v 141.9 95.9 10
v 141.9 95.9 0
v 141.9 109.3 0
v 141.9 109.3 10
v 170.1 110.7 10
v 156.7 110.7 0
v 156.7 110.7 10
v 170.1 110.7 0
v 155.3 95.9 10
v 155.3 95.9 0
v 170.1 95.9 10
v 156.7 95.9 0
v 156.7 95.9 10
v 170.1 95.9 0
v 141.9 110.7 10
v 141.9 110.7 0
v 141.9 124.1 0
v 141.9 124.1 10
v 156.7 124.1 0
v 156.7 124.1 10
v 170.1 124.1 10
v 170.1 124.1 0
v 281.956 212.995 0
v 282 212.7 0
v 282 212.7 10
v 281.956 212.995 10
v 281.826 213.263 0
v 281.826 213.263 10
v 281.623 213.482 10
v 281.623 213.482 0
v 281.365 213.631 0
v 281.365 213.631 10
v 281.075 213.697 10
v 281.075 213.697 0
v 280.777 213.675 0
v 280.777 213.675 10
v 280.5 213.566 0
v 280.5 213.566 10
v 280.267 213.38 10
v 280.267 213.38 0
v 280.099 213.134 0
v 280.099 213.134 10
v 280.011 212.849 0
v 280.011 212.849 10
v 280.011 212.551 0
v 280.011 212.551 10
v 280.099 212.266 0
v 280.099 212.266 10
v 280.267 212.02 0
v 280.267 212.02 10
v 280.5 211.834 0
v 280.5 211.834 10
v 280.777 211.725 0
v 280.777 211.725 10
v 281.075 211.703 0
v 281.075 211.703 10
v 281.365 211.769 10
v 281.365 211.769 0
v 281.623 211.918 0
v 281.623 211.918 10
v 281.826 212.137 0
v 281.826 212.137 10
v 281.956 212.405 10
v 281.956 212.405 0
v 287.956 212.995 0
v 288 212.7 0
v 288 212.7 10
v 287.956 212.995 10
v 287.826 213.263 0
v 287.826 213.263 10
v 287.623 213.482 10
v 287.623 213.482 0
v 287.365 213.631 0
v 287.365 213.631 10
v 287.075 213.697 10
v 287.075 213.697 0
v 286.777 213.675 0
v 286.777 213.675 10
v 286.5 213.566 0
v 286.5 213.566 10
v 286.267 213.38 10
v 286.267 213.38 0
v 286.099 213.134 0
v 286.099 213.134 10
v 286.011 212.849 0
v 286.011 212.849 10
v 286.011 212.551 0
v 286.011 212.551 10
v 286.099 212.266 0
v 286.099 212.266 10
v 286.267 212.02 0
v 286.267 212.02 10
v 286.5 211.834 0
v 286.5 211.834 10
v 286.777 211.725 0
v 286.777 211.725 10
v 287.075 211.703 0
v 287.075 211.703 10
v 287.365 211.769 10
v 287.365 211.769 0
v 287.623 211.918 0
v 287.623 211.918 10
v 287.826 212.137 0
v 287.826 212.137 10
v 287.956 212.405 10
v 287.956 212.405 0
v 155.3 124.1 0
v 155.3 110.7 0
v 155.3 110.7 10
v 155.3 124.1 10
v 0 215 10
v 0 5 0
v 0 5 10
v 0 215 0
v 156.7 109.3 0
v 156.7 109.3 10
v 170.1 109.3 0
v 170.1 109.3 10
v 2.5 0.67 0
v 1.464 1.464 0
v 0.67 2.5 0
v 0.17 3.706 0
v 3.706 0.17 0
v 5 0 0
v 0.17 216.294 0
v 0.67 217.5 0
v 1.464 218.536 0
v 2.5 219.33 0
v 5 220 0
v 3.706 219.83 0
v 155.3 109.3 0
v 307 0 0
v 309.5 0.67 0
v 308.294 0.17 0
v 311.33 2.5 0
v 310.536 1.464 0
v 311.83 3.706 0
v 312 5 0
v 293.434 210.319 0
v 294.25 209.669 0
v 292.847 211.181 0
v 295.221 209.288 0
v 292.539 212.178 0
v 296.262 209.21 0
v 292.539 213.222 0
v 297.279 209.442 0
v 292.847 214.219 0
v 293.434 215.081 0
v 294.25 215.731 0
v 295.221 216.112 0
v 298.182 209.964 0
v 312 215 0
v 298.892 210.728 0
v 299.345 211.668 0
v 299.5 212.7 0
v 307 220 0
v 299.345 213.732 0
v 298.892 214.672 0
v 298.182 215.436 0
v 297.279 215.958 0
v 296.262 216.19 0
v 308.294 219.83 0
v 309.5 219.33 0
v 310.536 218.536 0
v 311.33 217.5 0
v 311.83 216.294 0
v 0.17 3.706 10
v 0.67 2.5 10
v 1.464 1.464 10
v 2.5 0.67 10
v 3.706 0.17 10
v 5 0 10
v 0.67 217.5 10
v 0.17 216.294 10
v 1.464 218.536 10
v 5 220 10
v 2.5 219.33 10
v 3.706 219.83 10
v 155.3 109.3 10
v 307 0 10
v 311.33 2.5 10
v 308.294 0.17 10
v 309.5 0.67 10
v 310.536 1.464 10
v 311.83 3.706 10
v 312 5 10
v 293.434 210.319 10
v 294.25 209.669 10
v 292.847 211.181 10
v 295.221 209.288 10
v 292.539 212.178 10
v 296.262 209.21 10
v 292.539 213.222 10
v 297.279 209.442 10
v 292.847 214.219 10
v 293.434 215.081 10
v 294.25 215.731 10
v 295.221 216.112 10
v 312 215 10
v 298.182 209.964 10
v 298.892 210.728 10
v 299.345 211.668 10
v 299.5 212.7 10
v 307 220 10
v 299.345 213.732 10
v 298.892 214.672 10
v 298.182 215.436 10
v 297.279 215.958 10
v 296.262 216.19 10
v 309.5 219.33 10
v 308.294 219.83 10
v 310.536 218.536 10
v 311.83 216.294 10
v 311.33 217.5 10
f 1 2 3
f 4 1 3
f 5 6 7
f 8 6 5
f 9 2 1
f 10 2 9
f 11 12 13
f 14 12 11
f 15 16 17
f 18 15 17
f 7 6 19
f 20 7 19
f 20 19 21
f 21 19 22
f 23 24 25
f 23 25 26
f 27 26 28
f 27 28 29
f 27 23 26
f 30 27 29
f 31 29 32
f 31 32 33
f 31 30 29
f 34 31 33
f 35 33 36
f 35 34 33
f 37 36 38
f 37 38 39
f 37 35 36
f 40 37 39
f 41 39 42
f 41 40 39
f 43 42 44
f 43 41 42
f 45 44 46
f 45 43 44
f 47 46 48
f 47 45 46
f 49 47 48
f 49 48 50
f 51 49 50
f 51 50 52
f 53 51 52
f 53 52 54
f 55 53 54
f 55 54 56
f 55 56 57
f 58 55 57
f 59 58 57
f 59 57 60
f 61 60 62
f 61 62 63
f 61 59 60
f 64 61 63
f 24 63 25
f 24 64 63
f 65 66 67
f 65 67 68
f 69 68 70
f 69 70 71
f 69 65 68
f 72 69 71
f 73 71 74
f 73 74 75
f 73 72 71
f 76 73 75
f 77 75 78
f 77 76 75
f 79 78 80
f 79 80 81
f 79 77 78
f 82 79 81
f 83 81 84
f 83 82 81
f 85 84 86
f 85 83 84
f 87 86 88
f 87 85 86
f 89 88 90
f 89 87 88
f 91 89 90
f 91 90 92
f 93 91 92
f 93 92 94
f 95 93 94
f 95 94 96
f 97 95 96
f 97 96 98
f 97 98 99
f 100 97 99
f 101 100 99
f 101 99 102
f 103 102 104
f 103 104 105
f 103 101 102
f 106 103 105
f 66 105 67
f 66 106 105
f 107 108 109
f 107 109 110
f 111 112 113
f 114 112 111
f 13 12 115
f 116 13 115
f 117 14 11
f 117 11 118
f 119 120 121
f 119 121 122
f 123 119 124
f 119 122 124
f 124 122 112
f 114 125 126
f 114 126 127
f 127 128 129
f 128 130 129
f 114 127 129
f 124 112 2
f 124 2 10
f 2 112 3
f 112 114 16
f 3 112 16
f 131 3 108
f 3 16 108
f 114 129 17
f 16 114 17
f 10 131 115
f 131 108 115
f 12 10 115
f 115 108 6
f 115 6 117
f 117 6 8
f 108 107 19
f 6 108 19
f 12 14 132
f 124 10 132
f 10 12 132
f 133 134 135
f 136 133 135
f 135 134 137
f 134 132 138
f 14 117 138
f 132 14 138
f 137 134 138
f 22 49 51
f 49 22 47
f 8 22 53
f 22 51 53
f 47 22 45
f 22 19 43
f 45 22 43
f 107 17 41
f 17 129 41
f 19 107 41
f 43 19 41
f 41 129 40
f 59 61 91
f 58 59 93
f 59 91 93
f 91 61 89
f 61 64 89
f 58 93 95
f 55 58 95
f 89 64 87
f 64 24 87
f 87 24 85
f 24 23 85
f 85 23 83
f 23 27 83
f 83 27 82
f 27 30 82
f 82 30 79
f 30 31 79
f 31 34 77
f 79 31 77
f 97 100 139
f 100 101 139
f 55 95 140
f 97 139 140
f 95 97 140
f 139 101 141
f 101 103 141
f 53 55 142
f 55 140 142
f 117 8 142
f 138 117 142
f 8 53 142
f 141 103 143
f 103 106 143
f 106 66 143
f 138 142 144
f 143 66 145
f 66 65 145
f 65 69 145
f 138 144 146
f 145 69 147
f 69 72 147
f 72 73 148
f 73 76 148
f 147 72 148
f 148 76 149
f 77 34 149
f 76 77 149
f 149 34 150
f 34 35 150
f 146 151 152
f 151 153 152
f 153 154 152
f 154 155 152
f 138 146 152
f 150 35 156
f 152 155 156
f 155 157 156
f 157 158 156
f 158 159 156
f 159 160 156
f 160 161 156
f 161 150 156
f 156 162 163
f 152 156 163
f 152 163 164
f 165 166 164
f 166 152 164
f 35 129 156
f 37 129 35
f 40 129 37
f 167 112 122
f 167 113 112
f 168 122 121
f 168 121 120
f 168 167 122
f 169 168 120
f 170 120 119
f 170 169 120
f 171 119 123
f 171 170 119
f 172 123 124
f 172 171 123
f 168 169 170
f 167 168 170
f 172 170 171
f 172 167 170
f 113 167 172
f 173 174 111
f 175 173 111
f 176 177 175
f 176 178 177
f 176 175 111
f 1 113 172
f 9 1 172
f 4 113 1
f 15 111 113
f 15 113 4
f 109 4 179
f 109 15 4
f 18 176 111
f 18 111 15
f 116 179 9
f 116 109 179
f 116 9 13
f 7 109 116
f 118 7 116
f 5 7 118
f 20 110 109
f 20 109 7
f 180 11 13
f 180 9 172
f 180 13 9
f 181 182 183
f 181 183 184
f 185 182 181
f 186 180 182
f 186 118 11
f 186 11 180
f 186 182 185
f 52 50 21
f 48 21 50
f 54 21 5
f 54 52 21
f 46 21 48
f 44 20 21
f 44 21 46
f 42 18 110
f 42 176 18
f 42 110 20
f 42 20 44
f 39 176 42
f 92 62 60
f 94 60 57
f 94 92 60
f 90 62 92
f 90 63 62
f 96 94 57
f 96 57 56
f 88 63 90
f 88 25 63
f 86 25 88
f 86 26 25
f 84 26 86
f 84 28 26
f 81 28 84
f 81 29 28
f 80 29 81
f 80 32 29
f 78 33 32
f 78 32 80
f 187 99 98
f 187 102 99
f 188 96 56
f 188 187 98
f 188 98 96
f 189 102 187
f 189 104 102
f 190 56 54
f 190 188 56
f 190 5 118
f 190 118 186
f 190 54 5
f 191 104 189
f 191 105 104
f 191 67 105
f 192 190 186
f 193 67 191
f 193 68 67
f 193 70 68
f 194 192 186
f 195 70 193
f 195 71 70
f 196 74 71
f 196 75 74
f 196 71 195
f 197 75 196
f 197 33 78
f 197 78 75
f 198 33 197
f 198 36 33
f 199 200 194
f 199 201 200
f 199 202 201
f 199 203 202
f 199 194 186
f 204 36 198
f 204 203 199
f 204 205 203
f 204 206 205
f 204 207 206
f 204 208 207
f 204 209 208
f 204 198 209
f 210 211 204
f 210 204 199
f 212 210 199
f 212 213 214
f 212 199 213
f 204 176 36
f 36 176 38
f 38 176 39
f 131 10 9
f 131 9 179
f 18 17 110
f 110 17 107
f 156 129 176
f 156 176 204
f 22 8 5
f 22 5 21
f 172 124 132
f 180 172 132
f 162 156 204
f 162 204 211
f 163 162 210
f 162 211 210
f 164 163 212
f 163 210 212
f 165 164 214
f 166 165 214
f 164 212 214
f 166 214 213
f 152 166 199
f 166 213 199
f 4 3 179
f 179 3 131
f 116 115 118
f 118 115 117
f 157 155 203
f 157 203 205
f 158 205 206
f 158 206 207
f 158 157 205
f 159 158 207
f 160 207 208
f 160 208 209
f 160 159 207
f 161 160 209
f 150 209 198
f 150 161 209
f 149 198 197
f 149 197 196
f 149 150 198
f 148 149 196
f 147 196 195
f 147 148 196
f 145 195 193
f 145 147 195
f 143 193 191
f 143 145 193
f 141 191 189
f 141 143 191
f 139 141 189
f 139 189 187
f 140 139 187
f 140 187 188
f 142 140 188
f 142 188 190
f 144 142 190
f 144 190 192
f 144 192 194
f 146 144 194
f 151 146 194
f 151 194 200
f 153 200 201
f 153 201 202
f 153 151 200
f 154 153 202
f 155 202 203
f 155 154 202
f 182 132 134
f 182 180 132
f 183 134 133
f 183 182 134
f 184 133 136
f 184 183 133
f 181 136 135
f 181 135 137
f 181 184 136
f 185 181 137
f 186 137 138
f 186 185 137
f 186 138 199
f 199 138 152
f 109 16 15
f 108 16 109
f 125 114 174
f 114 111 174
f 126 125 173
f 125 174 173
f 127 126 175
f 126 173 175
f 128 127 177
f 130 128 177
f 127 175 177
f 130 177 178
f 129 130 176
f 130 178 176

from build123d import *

# Parameters (mm, degrees)
SKETCH1_W           = 312
SKETCH1_H           = 220
SKETCH1_R           = 3.5
SKETCH1_R_2         = 1
SKETCH1_W_2         = 13.4
SKETCH1_H_2         = 13.4
BOSS_EXTRUDE1_DEPTH = 10
FILLET1_R           = 5


with BuildPart() as part:
    # Sketch1 → Boss-Extrude1 (new body)
    with BuildSketch(Plane.XY):
        with Locations((156, 110)):
            Rectangle(SKETCH1_W, SKETCH1_H)
        with Locations((296, 212.7)):
            Circle(SKETCH1_R, mode=Mode.SUBTRACT)
        with Locations((287, 212.7)):
            Circle(SKETCH1_R_2, mode=Mode.SUBTRACT)
        with Locations((281, 212.7)):
            Circle(SKETCH1_R_2, mode=Mode.SUBTRACT)
        with Locations((148.6, 117.4)):
            Rectangle(SKETCH1_W_2, SKETCH1_H_2, mode=Mode.SUBTRACT)
        with Locations((163.4, 117.4)):
            Rectangle(SKETCH1_W_2, SKETCH1_H_2, mode=Mode.SUBTRACT)
        with Locations((148.6, 102.6)):
            Rectangle(SKETCH1_W_2, SKETCH1_H_2, mode=Mode.SUBTRACT)
        with Locations((163.4, 102.6)):
            Rectangle(SKETCH1_W_2, SKETCH1_H_2, mode=Mode.SUBTRACT)
    extrude(amount=BOSS_EXTRUDE1_DEPTH)

    # Fillet1
    fillet1_edges = [part.edges().sort_by_distance(p)[0] for p in [
        (0, 220, 5),
        (312, 220, 5),
        (312, 0, 5),
        (0, 0, 5),
    ]]
    fillet(fillet1_edges, radius=FILLET1_R)


solid = part.part
